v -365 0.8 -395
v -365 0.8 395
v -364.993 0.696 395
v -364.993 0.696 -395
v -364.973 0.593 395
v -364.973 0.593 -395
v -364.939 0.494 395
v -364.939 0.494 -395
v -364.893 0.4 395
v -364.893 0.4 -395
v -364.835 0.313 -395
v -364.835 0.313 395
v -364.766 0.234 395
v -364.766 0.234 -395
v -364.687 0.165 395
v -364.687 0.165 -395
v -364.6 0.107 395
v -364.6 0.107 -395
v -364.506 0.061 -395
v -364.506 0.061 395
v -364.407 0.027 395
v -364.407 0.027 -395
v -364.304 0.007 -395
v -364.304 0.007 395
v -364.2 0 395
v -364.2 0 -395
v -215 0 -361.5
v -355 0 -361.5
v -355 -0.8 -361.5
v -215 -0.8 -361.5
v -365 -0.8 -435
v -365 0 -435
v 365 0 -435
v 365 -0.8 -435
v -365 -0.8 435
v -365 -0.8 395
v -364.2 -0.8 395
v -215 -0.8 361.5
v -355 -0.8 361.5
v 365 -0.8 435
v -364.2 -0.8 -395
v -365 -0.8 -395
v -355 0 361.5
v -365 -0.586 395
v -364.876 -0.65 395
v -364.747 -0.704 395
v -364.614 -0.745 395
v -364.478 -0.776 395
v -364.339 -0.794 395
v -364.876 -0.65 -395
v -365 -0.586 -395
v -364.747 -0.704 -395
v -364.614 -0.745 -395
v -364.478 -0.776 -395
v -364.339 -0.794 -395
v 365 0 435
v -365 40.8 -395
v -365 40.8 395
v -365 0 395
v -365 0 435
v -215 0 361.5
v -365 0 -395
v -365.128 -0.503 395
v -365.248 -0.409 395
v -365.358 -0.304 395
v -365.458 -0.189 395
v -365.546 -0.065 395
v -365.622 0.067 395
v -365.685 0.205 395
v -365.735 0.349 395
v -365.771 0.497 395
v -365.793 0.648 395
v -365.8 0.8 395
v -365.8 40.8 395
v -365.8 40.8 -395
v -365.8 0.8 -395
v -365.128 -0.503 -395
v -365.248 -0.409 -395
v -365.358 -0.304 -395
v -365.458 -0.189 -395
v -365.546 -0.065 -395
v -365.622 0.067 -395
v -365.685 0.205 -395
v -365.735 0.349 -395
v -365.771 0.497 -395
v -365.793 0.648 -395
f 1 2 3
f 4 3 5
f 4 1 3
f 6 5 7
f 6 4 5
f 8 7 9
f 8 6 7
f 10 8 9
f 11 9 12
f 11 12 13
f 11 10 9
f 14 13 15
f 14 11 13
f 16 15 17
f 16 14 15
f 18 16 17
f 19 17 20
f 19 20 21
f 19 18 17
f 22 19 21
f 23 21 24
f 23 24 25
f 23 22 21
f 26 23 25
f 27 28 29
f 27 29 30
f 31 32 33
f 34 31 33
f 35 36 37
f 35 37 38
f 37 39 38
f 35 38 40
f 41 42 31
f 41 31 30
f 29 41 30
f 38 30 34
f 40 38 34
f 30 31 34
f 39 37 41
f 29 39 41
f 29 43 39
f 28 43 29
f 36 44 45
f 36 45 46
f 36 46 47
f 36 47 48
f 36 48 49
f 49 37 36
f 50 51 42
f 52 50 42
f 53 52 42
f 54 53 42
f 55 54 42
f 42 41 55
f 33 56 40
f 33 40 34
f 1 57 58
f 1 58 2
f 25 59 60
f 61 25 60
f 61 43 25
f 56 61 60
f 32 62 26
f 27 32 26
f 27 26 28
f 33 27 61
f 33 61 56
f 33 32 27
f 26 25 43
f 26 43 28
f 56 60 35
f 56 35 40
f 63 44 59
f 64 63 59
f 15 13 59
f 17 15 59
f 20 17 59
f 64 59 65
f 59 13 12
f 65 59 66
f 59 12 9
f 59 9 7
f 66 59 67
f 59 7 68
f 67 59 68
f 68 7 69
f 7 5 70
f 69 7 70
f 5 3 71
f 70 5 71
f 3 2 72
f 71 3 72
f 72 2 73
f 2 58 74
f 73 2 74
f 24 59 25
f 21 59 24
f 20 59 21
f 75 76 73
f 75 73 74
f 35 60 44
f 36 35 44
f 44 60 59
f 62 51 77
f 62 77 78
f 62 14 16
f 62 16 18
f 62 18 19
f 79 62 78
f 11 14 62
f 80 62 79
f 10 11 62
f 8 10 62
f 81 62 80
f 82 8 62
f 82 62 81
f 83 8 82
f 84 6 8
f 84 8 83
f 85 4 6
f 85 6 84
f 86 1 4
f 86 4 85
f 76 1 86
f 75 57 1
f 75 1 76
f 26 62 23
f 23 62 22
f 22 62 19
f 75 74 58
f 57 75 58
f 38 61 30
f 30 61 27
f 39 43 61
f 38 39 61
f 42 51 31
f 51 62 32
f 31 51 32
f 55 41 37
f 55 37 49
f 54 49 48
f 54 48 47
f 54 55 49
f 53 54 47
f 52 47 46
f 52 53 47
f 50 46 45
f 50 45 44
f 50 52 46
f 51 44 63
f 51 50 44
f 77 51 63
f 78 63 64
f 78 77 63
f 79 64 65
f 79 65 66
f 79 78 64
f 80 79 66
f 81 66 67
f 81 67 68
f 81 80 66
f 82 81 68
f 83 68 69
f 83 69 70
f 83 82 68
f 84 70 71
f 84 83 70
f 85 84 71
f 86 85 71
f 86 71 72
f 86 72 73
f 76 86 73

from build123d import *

# Parameters (mm, degrees)
SKETCH1_W                    = 730
SKETCH1_H                    = 870
SKETCH1_W_2                  = 140
SKETCH1_H_2                  = 723
BASE_FLANGE1_DEPTH           = 0.8
EDGE_FLANGE1_STRIP_W         = 4.8
EDGE_FLANGE1_STRIP_H         = 0.8
EDGE_FLANGE1_STRIP_CUT_DEPTH = 790
EDGE_FLANGE1_DEPTH           = 790


# Sheet-metal steps are written as plain solids
with BuildPart() as part:
    # Sketch1 → Base-Flange1 (new body)
    with BuildSketch(Plane(origin=(0, 0, 0), x_dir=(1, 0, 0), z_dir=(0, 1, 0))):
        Rectangle(SKETCH1_W, SKETCH1_H)
        with Locations((-285, 0)):
            Rectangle(SKETCH1_W_2, SKETCH1_H_2, mode=Mode.SUBTRACT)
    extrude(amount=-BASE_FLANGE1_DEPTH)

    # Edge-Flange1 strip (across the edge) → Edge-Flange1 strip cut (cut)
    with BuildSketch(Plane(origin=(-365, 0, -395), x_dir=(1, 0, 0), z_dir=(0, 0, 1))):
        with Locations((-1.6, -0.4)):
            Rectangle(EDGE_FLANGE1_STRIP_W, EDGE_FLANGE1_STRIP_H)
    extrude(amount=EDGE_FLANGE1_STRIP_CUT_DEPTH, mode=Mode.SUBTRACT)

    # Edge-Flange1 section (across the edge) → Edge-Flange1 (add)
    with BuildSketch(Plane(origin=(-365, 0, -395), x_dir=(1, 0, 0), z_dir=(0, 0, 1))):
        with BuildLine():
            Line((-0.8, 0.8), (-0.8, 40.8))
            Line((-0.8, 40.8), (0, 40.8))
            Line((0, 40.8), (0, 0.8))
            ThreePointArc((0, 0.8), (0.234314575, 0.234314575), (0.8, 0))
            Line((0.8, 0), (0.8, -0.8))
            ThreePointArc((0.8, -0.8), (-0.33137085, -0.33137085), (-0.8, 0.8))
        make_face()
    extrude(amount=EDGE_FLANGE1_DEPTH)


solid = part.part
